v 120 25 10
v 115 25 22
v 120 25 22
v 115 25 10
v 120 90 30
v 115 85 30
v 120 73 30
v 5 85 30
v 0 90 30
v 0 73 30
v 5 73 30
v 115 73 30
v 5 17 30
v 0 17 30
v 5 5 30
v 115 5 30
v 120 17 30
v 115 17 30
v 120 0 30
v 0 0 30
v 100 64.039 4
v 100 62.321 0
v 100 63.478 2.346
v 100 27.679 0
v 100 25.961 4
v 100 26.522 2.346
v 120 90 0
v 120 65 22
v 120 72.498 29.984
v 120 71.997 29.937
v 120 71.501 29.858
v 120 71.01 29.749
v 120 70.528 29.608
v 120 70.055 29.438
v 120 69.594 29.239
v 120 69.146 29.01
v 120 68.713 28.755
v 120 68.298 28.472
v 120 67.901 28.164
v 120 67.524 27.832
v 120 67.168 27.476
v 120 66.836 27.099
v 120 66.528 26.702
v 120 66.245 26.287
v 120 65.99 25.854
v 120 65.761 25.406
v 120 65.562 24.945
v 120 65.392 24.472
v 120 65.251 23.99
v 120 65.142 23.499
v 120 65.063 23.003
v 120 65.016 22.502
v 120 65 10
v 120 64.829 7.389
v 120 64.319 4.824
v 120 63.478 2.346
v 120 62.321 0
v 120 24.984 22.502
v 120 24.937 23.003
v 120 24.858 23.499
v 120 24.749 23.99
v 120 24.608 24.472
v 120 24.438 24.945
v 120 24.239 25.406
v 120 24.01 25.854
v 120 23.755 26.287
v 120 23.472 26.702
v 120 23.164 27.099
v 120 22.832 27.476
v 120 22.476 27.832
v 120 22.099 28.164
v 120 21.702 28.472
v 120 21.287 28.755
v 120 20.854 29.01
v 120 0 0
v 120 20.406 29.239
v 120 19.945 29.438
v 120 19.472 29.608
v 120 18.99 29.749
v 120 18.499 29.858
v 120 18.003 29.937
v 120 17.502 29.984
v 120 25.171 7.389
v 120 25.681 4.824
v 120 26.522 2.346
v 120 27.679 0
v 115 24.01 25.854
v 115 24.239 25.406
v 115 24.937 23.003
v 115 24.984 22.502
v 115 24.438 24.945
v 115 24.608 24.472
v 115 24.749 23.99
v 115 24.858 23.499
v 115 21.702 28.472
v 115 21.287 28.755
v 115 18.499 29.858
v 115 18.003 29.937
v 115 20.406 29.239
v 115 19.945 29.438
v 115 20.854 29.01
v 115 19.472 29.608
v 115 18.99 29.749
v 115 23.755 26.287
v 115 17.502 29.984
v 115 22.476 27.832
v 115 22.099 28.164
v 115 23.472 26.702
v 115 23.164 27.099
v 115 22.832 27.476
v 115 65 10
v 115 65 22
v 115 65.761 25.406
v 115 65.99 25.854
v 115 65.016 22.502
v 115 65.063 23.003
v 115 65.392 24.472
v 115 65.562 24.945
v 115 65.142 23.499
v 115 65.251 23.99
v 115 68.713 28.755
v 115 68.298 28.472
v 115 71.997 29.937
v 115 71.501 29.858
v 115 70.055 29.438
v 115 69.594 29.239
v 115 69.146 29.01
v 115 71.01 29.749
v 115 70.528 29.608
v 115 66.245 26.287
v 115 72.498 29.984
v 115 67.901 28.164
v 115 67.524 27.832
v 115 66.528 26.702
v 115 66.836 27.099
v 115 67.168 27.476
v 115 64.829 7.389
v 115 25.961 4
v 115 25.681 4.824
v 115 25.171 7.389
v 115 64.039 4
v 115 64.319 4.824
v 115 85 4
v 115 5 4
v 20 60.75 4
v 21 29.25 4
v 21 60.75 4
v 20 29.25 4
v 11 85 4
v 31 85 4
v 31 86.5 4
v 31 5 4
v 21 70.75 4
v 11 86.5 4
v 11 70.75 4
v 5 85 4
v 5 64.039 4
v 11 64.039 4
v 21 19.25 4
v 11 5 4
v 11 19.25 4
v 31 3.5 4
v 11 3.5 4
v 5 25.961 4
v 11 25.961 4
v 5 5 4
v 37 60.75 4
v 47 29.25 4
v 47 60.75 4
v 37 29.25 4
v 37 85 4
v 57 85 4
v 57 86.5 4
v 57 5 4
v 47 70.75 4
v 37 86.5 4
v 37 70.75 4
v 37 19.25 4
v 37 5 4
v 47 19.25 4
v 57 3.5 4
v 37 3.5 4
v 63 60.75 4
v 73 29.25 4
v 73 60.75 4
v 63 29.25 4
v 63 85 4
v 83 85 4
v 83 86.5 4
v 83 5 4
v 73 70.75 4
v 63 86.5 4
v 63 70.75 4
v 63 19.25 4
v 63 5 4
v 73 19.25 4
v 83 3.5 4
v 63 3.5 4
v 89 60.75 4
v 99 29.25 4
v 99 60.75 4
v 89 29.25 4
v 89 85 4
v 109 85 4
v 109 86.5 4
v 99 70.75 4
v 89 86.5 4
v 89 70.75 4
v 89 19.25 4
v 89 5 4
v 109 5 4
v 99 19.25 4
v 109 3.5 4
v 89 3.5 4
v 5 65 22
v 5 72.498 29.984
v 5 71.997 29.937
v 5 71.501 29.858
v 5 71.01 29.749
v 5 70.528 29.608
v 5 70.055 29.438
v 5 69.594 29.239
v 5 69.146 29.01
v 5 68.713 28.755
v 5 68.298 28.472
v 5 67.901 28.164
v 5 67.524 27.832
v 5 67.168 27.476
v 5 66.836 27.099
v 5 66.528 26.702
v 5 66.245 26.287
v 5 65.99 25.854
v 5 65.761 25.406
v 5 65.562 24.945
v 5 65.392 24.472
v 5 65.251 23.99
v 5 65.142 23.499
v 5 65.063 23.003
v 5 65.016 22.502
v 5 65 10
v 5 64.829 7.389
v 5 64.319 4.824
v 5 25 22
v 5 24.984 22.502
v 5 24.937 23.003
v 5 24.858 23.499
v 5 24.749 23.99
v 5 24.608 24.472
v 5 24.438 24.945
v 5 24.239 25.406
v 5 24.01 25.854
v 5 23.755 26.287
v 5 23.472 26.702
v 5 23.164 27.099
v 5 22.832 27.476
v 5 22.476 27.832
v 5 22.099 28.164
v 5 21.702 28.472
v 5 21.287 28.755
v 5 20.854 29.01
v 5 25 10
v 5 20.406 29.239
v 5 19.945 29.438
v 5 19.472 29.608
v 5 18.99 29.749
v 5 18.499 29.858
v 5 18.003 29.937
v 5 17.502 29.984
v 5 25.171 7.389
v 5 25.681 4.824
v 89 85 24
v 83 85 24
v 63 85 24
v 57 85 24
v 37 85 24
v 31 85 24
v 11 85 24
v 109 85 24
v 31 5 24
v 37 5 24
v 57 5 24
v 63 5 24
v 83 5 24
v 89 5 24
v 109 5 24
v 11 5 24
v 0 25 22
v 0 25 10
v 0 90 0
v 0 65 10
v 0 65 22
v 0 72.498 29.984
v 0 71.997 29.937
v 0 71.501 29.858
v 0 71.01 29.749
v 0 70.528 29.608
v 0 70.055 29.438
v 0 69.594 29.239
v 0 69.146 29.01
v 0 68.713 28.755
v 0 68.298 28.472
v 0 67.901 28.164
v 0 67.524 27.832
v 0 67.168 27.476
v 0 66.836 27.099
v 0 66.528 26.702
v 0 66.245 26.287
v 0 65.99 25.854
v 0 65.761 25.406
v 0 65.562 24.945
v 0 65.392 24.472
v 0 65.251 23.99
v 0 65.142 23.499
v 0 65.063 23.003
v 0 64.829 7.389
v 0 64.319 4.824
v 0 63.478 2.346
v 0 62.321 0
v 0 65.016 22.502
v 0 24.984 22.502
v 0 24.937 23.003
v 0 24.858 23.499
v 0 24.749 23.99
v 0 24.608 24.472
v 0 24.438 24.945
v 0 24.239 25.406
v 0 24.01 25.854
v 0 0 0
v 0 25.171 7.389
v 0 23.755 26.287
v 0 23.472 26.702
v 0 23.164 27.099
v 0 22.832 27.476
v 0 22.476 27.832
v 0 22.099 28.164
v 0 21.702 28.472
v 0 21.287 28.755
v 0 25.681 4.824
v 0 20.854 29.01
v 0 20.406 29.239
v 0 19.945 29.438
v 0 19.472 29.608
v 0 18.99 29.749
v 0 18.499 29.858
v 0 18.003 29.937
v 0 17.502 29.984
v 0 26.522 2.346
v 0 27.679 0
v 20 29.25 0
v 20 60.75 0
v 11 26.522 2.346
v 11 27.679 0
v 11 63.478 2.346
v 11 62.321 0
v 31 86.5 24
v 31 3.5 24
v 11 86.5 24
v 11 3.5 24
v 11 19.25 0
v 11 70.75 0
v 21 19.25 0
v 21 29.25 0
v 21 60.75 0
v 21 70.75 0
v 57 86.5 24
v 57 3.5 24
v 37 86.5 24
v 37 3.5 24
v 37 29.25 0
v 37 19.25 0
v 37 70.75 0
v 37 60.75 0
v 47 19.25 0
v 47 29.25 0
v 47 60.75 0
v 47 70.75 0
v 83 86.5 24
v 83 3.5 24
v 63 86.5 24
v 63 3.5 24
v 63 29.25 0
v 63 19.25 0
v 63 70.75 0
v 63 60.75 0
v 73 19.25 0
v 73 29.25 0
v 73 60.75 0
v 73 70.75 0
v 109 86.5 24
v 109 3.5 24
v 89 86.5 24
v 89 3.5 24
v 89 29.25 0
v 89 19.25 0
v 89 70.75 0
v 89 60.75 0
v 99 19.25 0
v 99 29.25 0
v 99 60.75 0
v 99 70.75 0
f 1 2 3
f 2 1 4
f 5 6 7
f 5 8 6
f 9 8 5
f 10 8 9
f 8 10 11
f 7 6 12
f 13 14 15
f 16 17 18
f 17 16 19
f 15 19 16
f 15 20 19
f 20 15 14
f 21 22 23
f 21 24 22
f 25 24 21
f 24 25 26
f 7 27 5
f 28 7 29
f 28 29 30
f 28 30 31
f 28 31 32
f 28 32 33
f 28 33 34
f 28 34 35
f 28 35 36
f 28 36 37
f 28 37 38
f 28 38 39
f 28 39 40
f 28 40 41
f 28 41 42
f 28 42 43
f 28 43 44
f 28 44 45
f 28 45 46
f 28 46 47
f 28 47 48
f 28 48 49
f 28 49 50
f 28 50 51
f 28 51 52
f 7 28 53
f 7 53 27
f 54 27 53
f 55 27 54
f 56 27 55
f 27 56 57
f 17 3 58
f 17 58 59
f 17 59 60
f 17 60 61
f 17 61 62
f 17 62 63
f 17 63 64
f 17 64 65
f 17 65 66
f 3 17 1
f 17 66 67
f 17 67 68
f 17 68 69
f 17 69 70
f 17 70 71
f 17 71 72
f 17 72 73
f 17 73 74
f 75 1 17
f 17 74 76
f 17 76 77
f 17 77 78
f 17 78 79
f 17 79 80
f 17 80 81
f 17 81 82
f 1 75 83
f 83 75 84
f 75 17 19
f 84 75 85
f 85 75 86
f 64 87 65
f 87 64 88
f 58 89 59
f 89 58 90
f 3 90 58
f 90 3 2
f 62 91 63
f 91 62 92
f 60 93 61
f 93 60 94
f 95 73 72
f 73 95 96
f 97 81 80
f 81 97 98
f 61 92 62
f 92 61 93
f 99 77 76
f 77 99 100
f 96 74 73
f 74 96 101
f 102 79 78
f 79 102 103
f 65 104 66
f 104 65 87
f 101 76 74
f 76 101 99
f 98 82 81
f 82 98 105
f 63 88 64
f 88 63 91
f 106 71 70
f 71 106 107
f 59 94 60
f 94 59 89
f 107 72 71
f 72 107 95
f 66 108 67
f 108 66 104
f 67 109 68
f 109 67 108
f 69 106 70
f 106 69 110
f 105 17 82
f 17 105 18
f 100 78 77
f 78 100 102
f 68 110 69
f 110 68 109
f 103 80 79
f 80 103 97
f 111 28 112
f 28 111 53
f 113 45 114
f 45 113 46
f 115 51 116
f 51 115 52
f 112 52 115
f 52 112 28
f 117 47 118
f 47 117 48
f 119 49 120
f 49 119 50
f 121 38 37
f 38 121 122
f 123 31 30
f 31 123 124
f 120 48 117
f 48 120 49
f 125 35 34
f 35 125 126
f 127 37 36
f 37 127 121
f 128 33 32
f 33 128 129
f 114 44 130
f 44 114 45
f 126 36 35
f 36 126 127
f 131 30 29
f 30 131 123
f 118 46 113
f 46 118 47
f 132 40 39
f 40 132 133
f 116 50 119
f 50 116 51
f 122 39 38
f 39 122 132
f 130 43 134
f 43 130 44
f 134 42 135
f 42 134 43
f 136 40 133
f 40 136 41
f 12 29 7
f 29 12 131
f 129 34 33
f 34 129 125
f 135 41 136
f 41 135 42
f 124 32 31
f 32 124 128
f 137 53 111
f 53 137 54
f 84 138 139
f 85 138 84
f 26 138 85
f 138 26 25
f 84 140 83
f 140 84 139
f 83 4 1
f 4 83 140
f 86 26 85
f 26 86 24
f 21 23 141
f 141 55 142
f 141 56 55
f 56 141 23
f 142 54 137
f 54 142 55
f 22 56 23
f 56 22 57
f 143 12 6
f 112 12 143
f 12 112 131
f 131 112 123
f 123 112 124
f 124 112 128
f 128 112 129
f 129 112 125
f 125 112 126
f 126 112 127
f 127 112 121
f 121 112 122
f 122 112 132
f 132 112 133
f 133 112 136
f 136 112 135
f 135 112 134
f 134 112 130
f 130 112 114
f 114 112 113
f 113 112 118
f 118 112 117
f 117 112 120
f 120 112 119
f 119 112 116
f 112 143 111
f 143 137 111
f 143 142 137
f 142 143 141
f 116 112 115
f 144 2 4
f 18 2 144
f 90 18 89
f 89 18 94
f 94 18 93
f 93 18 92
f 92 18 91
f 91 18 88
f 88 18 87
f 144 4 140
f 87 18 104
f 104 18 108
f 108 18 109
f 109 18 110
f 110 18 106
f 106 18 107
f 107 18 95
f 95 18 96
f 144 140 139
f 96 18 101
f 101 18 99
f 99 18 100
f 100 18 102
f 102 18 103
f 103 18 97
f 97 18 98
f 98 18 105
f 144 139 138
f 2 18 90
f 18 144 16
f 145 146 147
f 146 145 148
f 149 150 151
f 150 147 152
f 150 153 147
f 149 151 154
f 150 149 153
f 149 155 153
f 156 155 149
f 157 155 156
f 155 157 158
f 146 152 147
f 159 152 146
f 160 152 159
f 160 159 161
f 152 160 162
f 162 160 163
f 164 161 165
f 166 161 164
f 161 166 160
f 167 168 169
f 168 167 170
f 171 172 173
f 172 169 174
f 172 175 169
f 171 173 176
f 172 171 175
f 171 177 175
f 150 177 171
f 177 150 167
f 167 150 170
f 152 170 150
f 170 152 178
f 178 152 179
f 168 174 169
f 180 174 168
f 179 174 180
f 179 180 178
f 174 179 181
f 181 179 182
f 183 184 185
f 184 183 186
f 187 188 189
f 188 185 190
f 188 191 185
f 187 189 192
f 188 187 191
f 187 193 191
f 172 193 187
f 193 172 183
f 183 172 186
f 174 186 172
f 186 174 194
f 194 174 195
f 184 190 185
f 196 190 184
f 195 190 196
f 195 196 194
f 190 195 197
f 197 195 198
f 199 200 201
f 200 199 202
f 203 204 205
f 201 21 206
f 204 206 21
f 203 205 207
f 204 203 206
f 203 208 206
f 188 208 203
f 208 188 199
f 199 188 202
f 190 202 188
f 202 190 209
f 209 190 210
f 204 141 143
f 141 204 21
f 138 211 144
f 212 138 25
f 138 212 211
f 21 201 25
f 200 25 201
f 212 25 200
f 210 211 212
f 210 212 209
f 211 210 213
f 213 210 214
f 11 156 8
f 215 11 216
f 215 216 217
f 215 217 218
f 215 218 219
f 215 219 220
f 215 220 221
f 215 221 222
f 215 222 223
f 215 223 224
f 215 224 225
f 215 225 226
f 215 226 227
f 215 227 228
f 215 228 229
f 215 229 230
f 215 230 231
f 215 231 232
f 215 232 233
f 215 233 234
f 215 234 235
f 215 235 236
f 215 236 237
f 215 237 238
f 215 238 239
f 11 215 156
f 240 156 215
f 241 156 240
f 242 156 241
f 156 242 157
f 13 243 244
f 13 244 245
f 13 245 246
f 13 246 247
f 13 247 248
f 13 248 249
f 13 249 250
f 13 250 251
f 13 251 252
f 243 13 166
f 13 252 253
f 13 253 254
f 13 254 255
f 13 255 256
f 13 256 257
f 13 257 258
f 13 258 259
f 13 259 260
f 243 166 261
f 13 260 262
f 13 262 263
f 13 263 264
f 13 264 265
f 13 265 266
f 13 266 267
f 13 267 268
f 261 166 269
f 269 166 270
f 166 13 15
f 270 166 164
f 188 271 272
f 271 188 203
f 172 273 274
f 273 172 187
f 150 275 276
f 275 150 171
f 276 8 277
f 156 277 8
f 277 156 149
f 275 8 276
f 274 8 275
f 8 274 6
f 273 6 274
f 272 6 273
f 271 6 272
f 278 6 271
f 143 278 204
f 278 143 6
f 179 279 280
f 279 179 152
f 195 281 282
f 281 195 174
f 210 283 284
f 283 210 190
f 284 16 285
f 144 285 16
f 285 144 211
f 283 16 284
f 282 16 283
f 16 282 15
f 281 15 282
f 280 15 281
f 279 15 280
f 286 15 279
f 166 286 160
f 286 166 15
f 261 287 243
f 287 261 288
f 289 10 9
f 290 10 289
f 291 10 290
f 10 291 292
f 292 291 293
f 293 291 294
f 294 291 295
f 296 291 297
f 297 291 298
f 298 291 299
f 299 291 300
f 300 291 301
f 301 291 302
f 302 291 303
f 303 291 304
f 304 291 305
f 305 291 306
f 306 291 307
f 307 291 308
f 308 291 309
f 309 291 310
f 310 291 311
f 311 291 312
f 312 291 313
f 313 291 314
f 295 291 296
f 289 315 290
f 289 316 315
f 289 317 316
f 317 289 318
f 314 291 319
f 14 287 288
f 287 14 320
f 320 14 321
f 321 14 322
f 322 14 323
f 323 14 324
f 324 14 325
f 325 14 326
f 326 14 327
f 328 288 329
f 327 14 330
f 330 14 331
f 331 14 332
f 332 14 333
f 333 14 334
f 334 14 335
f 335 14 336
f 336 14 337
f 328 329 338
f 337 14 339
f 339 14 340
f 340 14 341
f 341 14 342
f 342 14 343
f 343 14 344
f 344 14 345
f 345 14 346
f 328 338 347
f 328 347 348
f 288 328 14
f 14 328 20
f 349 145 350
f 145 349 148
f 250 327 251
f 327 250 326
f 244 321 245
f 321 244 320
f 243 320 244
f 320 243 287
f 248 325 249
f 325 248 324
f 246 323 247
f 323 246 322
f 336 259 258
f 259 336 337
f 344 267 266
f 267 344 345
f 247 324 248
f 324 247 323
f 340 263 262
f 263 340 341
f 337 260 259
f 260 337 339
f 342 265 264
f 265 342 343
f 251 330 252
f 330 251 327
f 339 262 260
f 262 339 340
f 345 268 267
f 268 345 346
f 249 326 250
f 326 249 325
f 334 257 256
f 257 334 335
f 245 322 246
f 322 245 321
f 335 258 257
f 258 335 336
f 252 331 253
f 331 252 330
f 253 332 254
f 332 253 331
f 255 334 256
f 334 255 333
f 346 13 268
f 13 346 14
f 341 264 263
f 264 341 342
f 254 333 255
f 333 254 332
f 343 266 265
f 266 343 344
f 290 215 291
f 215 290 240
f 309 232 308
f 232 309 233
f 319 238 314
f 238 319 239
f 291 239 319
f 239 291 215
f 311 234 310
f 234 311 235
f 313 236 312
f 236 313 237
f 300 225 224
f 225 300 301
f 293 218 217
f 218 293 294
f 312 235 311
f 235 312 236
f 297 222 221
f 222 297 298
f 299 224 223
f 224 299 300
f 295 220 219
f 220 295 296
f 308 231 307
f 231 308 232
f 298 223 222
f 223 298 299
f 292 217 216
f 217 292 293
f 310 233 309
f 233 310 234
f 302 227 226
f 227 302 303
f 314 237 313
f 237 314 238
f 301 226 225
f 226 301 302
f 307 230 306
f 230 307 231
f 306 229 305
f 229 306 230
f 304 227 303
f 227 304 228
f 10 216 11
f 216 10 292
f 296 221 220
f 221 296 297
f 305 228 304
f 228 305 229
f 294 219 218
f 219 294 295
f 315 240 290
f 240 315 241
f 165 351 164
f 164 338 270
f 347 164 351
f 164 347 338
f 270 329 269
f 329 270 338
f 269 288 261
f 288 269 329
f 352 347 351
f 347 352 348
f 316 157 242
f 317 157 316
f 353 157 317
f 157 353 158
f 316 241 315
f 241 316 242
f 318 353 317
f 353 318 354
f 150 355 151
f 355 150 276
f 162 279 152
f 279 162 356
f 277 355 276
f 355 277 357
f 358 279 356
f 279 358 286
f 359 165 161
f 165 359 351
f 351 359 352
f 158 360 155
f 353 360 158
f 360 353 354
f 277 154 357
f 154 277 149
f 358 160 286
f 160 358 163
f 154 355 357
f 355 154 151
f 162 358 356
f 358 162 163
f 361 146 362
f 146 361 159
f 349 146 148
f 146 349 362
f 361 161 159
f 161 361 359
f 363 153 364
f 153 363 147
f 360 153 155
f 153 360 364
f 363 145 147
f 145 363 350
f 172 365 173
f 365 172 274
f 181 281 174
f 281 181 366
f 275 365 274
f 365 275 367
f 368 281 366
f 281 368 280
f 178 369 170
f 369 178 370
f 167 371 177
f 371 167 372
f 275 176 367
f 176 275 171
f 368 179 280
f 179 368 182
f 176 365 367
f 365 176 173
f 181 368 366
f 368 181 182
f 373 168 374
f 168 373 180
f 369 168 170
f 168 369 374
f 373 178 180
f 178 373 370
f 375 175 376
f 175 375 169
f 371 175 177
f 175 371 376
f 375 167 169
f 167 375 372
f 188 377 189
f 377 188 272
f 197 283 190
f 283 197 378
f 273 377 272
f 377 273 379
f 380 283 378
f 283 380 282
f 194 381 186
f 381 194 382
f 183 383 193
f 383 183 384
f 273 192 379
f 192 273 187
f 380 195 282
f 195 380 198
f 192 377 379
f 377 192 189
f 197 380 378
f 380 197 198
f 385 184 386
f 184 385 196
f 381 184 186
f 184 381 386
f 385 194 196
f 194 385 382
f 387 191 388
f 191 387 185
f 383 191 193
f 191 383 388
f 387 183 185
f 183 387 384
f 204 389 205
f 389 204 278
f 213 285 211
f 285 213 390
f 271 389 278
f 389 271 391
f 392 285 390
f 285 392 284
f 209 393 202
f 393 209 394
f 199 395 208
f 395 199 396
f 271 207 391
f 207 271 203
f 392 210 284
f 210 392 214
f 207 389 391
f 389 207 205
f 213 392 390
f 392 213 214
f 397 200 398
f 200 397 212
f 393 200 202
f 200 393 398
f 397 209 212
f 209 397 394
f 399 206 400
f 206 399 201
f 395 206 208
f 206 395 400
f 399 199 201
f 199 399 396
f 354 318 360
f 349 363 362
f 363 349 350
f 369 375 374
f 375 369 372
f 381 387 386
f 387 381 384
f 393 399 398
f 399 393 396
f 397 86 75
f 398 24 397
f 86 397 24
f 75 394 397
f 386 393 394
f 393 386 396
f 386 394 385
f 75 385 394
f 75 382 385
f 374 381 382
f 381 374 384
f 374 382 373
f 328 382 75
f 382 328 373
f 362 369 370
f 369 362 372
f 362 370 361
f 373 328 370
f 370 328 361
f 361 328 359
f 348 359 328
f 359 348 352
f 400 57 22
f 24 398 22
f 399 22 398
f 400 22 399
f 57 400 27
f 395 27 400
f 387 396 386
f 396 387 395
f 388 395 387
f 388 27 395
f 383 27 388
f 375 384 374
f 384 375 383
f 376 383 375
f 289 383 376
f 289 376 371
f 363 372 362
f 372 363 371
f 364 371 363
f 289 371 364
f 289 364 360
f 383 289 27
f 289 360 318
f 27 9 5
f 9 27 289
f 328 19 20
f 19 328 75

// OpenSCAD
$fn=48;
translate([0,0,0])
{
difference()
{
    cube(size = [120.00, 90.00, 30.00], center = false); 
    translate(v = [5.00, 5.00, 4.00])
    {
        union()
        {
            union()
            {
                union()
                {
                    cube(size = [110.00, 80.00, 26.00], center = false); 
                    translate(v = [105.00, 12.00, -14.00])
                    {
                        rotate([0.00, 0.00, 90.00])
                        {
                            translate(v = [28.00, 0.00, 20.00])
                            {
                                union()
                                {
                                    hull()
                                    {
                                        rotate([90.00, 0.00, 0.00])
                                        {
                                            difference()
                                            {
                                                cylinder(center = true, r1 = 20, r2 = 20, h = 20);
                                                translate(v = [-40.00, 0.00, -10.00])
                                                {
                                                    cube(size = [80.00, 40.00, 20.00], center = false); 
                                                }
                                            }
                                        }
                                        translate(v = [-20.00, -10.00, 0.00])
                                        {
                                            cube(size = [40.00, 20.00, 20.00], center = false); 
                                        }
                                    }
                                    translate(v = [-28.00, -10.00, 12.00])
                                    {
                                        difference()
                                        {
                                            cube(size = [8.00, 20.00, 8.00], center = false); 
                                            translate(v = [0.00, 20.00, 0.00])
                                            {
                                                rotate([90.00, 0.00, 0.00])
                                                {
                                                    cylinder(center = false, r1 = 8, r2 = 8, h = 20, $fn = 100);
                                                }
                                            }
                                        }
                                    }
                                    mirror([40.00, 0.00, 0.00])
                                    {
                                        translate(v = [-28.00, -10.00, 12.00])
                                        {
                                            difference()
                                            {
                                                cube(size = [8.00, 20.00, 8.00], center = false); 
                                                translate(v = [0.00, 20.00, 0.00])
                                                {
                                                    rotate([90.00, 0.00, 0.00])
                                                    {
                                                        cylinder(center = false, r1 = 8, r2 = 8, h = 20, $fn = 100);
                                                    }
                                                }
                                            }
                                        }
                                    }
                                }
                            }
                        }
                    }
                }
                translate(v = [5.00, 12.00, -14.00])
                {
                    rotate([0.00, 0.00, 90.00])
                    {
                        translate(v = [28.00, 0.00, 20.00])
                        {
                            union()
                            {
                                hull()
                                {
                                    rotate([90.00, 0.00, 0.00])
                                    {
                                        difference()
                                        {
                                            cylinder(center = true, r1 = 20, r2 = 20, h = 20);
                                            translate(v = [-40.00, 0.00, -10.00])
                                            {
                                                cube(size = [80.00, 40.00, 20.00], center = false); 
                                            }
                                        }
                                    }
                                    translate(v = [-20.00, -10.00, 0.00])
                                    {
                                        cube(size = [40.00, 20.00, 20.00], center = false); 
                                    }
                                }
                                translate(v = [-28.00, -10.00, 12.00])
                                {
                                    difference()
                                    {
                                        cube(size = [8.00, 20.00, 8.00], center = false); 
                                        translate(v = [0.00, 20.00, 0.00])
                                        {
                                            rotate([90.00, 0.00, 0.00])
                                            {
                                                cylinder(center = false, r1 = 8, r2 = 8, h = 20, $fn = 100);
                                            }
                                        }
                                    }
                                }
                                mirror([40.00, 0.00, 0.00])
                                {
                                    translate(v = [-28.00, -10.00, 12.00])
                                    {
                                        difference()
                                        {
                                            cube(size = [8.00, 20.00, 8.00], center = false); 
                                            translate(v = [0.00, 20.00, 0.00])
                                            {
                                                rotate([90.00, 0.00, 0.00])
                                                {
                                                    cylinder(center = false, r1 = 8, r2 = 8, h = 20, $fn = 100);
                                                }
                                            }
                                        }
                                    }
                                }
                            }
                        }
                    }
                }
            }
            translate(v = [6.00, -1.50, 0.00])
            {
                union()
                {
                    difference()
                    {
                        cube(size = [20.00, 83.00, 20.00], center = false); 
                        difference()
                        {
                            translate(v = [20.00, 41.50, 10.00])
                            {
                                cube(size = [10.00, 73.00, 10.00], center = true); 
                            }
                            translate(v = [20.00, 6.50, 15.00])
                            {
                                rotate([0.00, 90.00, 0.00])
                                {
                                    cylinder(center = true, r1 = 12.5, r2 = 12.5, h = 5, $fn = 50);
                                }
                            }
                        }
                        translate(v = [1.00, 51.50, -10.00])
                        {
                            translate(v = [6.00, 0.00, 1.00])
                            {
                                union()
                                {
                                    hull()
                                    {
                                        rotate([90.00, 0.00, 0.00])
                                        {
                                            difference()
                                            {
                                                cylinder(center = true, r1 = 1, r2 = 1, h = 20);
                                                translate(v = [-2.00, 0.00, -10.00])
                                                {
                                                    cube(size = [4.00, 2.00, 20.00], center = false); 
                                                }
                                            }
                                        }
                                        translate(v = [-1.00, -10.00, 0.00])
                                        {
                                            cube(size = [2.00, 20.00, 39.00], center = false); 
                                        }
                                    }
                                    translate(v = [-6.00, -10.00, 34.00])
                                    {
                                        difference()
                                        {
                                            cube(size = [5.00, 20.00, 5.00], center = false); 
                                            translate(v = [0.00, 20.00, 0.00])
                                            {
                                                rotate([90.00, 0.00, 0.00])
                                                {
                                                    cylinder(center = false, r1 = 5, r2 = 5, h = 20, $fn = 100);
                                                }
                                            }
                                        }
                                    }
                                    mirror([2.00, 0.00, 0.00])
                                    {
                                        translate(v = [-6.00, -10.00, 34.00])
                                        {
                                            difference()
                                            {
                                                cube(size = [5.00, 20.00, 5.00], center = false); 
                                                translate(v = [0.00, 20.00, 0.00])
                                                {
                                                    rotate([90.00, 0.00, 0.00])
                                                    {
                                                        cylinder(center = false, r1 = 5, r2 = 5, h = 20, $fn = 100);
                                                    }
                                                }
                                            }
                                        }
                                    }
                                }
                            }
                        }
                    }
                    translate(v = [0.00, 15.75, -5.00])
                    {
                        cube(size = [10.00, 10.00, 5.00], center = false); 
                    }
                    translate(v = [0.00, 57.25, -5.00])
                    {
                        cube(size = [10.00, 10.00, 5.00], center = false); 
                    }
                }
            }
            translate(v = [32.00, -1.50, 0.00])
            {
                union()
                {
                    difference()
                    {
                        cube(size = [20.00, 83.00, 20.00], center = false); 
                        difference()
                        {
                            translate(v = [20.00, 41.50, 10.00])
                            {
                                cube(size = [10.00, 73.00, 10.00], center = true); 
                            }
                            translate(v = [20.00, 6.50, 15.00])
                            {
                                rotate([0.00, 90.00, 0.00])
                                {
                                    cylinder(center = true, r1 = 12.5, r2 = 12.5, h = 5, $fn = 50);
                                }
                            }
                        }
                        translate(v = [1.00, 51.50, -10.00])
                        {
                            translate(v = [6.00, 0.00, 1.00])
                            {
                                union()
                                {
                                    hull()
                                    {
                                        rotate([90.00, 0.00, 0.00])
                                        {
                                            difference()
                                            {
                                                cylinder(center = true, r1 = 1, r2 = 1, h = 20);
                                                translate(v = [-2.00, 0.00, -10.00])
                                                {
                                                    cube(size = [4.00, 2.00, 20.00], center = false); 
                                                }
                                            }
                                        }
                                        translate(v = [-1.00, -10.00, 0.00])
                                        {
                                            cube(size = [2.00, 20.00, 39.00], center = false); 
                                        }
                                    }
                                    translate(v = [-6.00, -10.00, 34.00])
                                    {
                                        difference()
                                        {
                                            cube(size = [5.00, 20.00, 5.00], center = false); 
                                            translate(v = [0.00, 20.00, 0.00])
                                            {
                                                rotate([90.00, 0.00, 0.00])
                                                {
                                                    cylinder(center = false, r1 = 5, r2 = 5, h = 20, $fn = 100);
                                                }
                                            }
                                        }
                                    }
                                    mirror([2.00, 0.00, 0.00])
                                    {
                                        translate(v = [-6.00, -10.00, 34.00])
                                        {
                                            difference()
                                            {
                                                cube(size = [5.00, 20.00, 5.00], center = false); 
                                                translate(v = [0.00, 20.00, 0.00])
                                                {
                                                    rotate([90.00, 0.00, 0.00])
                                                    {
                                                        cylinder(center = false, r1 = 5, r2 = 5, h = 20, $fn = 100);
                                                    }
                                                }
                                            }
                                        }
                                    }
                                }
                            }
                        }
                    }
                    translate(v = [0.00, 15.75, -5.00])
                    {
                        cube(size = [10.00, 10.00, 5.00], center = false); 
                    }
                    translate(v = [0.00, 57.25, -5.00])
                    {
                        cube(size = [10.00, 10.00, 5.00], center = false); 
                    }
                }
            }
            translate(v = [58.00, -1.50, 0.00])
            {
                union()
                {
                    difference()
                    {
                        cube(size = [20.00, 83.00, 20.00], center = false); 
                        difference()
                        {
                            translate(v = [20.00, 41.50, 10.00])
                            {
                                cube(size = [10.00, 73.00, 10.00], center = true); 
                            }
                            translate(v = [20.00, 6.50, 15.00])
                            {
                                rotate([0.00, 90.00, 0.00])
                                {
                                    cylinder(center = true, r1 = 12.5, r2 = 12.5, h = 5, $fn = 50);
                                }
                            }
                        }
                        translate(v = [1.00, 51.50, -10.00])
                        {
                            translate(v = [6.00, 0.00, 1.00])
                            {
                                union()
                                {
                                    hull()
                                    {
                                        rotate([90.00, 0.00, 0.00])
                                        {
                                            difference()
                                            {
                                                cylinder(center = true, r1 = 1, r2 = 1, h = 20);
                                                translate(v = [-2.00, 0.00, -10.00])
                                                {
                                                    cube(size = [4.00, 2.00, 20.00], center = false); 
                                                }
                                            }
                                        }
                                        translate(v = [-1.00, -10.00, 0.00])
                                        {
                                            cube(size = [2.00, 20.00, 39.00], center = false); 
                                        }
                                    }
                                    translate(v = [-6.00, -10.00, 34.00])
                                    {
                                        difference()
                                        {
                                            cube(size = [5.00, 20.00, 5.00], center = false); 
                                            translate(v = [0.00, 20.00, 0.00])
                                            {
                                                rotate([90.00, 0.00, 0.00])
                                                {
                                                    cylinder(center = false, r1 = 5, r2 = 5, h = 20, $fn = 100);
                                                }
                                            }
                                        }
                                    }
                                    mirror([2.00, 0.00, 0.00])
                                    {
                                        translate(v = [-6.00, -10.00, 34.00])
                                        {
                                            difference()
                                            {
                                                cube(size = [5.00, 20.00, 5.00], center = false); 
                                                translate(v = [0.00, 20.00, 0.00])
                                                {
                                                    rotate([90.00, 0.00, 0.00])
                                                    {
                                                        cylinder(center = false, r1 = 5, r2 = 5, h = 20, $fn = 100);
                                                    }
                                                }
                                            }
                                        }
                                    }
                                }
                            }
                        }
                    }
                    translate(v = [0.00, 15.75, -5.00])
                    {
                        cube(size = [10.00, 10.00, 5.00], center = false); 
                    }
                    translate(v = [0.00, 57.25, -5.00])
                    {
                        cube(size = [10.00, 10.00, 5.00], center = false); 
                    }
                }
            }
            translate(v = [84.00, -1.50, 0.00])
            {
                union()
                {
                    difference()
                    {
                        cube(size = [20.00, 83.00, 20.00], center = false); 
                        difference()
                        {
                            translate(v = [20.00, 41.50, 10.00])
                            {
                                cube(size = [10.00, 73.00, 10.00], center = true); 
                            }
                            translate(v = [20.00, 6.50, 15.00])
                            {
                                rotate([0.00, 90.00, 0.00])
                                {
                                    cylinder(center = true, r1 = 12.5, r2 = 12.5, h = 5, $fn = 50);
                                }
                            }
                        }
                        translate(v = [1.00, 51.50, -10.00])
                        {
                            translate(v = [6.00, 0.00, 1.00])
                            {
                                union()
                                {
                                    hull()
                                    {
                                        rotate([90.00, 0.00, 0.00])
                                        {
                                            difference()
                                            {
                                                cylinder(center = true, r1 = 1, r2 = 1, h = 20);
                                                translate(v = [-2.00, 0.00, -10.00])
                                                {
                                                    cube(size = [4.00, 2.00, 20.00], center = false); 
                                                }
                                            }
                                        }
                                        translate(v = [-1.00, -10.00, 0.00])
                                        {
                                            cube(size = [2.00, 20.00, 39.00], center = false); 
                                        }
                                    }
                                    translate(v = [-6.00, -10.00, 34.00])
                                    {
                                        difference()
                                        {
                                            cube(size = [5.00, 20.00, 5.00], center = false); 
                                            translate(v = [0.00, 20.00, 0.00])
                                            {
                                                rotate([90.00, 0.00, 0.00])
                                                {
                                                    cylinder(center = false, r1 = 5, r2 = 5, h = 20, $fn = 100);
                                                }
                                            }
                                        }
                                    }
                                    mirror([2.00, 0.00, 0.00])
                                    {
                                        translate(v = [-6.00, -10.00, 34.00])
                                        {
                                            difference()
                                            {
                                                cube(size = [5.00, 20.00, 5.00], center = false); 
                                                translate(v = [0.00, 20.00, 0.00])
                                                {
                                                    rotate([90.00, 0.00, 0.00])
                                                    {
                                                        cylinder(center = false, r1 = 5, r2 = 5, h = 20, $fn = 100);
                                                    }
                                                }
                                            }
                                        }
                                    }
                                }
                            }
                        }
                    }
                    translate(v = [0.00, 15.75, -5.00])
                    {
                        cube(size = [10.00, 10.00, 5.00], center = false); 
                    }
                    translate(v = [0.00, 57.25, -5.00])
                    {
                        cube(size = [10.00, 10.00, 5.00], center = false); 
                    }
                }
            }
        }
    }
}

}
